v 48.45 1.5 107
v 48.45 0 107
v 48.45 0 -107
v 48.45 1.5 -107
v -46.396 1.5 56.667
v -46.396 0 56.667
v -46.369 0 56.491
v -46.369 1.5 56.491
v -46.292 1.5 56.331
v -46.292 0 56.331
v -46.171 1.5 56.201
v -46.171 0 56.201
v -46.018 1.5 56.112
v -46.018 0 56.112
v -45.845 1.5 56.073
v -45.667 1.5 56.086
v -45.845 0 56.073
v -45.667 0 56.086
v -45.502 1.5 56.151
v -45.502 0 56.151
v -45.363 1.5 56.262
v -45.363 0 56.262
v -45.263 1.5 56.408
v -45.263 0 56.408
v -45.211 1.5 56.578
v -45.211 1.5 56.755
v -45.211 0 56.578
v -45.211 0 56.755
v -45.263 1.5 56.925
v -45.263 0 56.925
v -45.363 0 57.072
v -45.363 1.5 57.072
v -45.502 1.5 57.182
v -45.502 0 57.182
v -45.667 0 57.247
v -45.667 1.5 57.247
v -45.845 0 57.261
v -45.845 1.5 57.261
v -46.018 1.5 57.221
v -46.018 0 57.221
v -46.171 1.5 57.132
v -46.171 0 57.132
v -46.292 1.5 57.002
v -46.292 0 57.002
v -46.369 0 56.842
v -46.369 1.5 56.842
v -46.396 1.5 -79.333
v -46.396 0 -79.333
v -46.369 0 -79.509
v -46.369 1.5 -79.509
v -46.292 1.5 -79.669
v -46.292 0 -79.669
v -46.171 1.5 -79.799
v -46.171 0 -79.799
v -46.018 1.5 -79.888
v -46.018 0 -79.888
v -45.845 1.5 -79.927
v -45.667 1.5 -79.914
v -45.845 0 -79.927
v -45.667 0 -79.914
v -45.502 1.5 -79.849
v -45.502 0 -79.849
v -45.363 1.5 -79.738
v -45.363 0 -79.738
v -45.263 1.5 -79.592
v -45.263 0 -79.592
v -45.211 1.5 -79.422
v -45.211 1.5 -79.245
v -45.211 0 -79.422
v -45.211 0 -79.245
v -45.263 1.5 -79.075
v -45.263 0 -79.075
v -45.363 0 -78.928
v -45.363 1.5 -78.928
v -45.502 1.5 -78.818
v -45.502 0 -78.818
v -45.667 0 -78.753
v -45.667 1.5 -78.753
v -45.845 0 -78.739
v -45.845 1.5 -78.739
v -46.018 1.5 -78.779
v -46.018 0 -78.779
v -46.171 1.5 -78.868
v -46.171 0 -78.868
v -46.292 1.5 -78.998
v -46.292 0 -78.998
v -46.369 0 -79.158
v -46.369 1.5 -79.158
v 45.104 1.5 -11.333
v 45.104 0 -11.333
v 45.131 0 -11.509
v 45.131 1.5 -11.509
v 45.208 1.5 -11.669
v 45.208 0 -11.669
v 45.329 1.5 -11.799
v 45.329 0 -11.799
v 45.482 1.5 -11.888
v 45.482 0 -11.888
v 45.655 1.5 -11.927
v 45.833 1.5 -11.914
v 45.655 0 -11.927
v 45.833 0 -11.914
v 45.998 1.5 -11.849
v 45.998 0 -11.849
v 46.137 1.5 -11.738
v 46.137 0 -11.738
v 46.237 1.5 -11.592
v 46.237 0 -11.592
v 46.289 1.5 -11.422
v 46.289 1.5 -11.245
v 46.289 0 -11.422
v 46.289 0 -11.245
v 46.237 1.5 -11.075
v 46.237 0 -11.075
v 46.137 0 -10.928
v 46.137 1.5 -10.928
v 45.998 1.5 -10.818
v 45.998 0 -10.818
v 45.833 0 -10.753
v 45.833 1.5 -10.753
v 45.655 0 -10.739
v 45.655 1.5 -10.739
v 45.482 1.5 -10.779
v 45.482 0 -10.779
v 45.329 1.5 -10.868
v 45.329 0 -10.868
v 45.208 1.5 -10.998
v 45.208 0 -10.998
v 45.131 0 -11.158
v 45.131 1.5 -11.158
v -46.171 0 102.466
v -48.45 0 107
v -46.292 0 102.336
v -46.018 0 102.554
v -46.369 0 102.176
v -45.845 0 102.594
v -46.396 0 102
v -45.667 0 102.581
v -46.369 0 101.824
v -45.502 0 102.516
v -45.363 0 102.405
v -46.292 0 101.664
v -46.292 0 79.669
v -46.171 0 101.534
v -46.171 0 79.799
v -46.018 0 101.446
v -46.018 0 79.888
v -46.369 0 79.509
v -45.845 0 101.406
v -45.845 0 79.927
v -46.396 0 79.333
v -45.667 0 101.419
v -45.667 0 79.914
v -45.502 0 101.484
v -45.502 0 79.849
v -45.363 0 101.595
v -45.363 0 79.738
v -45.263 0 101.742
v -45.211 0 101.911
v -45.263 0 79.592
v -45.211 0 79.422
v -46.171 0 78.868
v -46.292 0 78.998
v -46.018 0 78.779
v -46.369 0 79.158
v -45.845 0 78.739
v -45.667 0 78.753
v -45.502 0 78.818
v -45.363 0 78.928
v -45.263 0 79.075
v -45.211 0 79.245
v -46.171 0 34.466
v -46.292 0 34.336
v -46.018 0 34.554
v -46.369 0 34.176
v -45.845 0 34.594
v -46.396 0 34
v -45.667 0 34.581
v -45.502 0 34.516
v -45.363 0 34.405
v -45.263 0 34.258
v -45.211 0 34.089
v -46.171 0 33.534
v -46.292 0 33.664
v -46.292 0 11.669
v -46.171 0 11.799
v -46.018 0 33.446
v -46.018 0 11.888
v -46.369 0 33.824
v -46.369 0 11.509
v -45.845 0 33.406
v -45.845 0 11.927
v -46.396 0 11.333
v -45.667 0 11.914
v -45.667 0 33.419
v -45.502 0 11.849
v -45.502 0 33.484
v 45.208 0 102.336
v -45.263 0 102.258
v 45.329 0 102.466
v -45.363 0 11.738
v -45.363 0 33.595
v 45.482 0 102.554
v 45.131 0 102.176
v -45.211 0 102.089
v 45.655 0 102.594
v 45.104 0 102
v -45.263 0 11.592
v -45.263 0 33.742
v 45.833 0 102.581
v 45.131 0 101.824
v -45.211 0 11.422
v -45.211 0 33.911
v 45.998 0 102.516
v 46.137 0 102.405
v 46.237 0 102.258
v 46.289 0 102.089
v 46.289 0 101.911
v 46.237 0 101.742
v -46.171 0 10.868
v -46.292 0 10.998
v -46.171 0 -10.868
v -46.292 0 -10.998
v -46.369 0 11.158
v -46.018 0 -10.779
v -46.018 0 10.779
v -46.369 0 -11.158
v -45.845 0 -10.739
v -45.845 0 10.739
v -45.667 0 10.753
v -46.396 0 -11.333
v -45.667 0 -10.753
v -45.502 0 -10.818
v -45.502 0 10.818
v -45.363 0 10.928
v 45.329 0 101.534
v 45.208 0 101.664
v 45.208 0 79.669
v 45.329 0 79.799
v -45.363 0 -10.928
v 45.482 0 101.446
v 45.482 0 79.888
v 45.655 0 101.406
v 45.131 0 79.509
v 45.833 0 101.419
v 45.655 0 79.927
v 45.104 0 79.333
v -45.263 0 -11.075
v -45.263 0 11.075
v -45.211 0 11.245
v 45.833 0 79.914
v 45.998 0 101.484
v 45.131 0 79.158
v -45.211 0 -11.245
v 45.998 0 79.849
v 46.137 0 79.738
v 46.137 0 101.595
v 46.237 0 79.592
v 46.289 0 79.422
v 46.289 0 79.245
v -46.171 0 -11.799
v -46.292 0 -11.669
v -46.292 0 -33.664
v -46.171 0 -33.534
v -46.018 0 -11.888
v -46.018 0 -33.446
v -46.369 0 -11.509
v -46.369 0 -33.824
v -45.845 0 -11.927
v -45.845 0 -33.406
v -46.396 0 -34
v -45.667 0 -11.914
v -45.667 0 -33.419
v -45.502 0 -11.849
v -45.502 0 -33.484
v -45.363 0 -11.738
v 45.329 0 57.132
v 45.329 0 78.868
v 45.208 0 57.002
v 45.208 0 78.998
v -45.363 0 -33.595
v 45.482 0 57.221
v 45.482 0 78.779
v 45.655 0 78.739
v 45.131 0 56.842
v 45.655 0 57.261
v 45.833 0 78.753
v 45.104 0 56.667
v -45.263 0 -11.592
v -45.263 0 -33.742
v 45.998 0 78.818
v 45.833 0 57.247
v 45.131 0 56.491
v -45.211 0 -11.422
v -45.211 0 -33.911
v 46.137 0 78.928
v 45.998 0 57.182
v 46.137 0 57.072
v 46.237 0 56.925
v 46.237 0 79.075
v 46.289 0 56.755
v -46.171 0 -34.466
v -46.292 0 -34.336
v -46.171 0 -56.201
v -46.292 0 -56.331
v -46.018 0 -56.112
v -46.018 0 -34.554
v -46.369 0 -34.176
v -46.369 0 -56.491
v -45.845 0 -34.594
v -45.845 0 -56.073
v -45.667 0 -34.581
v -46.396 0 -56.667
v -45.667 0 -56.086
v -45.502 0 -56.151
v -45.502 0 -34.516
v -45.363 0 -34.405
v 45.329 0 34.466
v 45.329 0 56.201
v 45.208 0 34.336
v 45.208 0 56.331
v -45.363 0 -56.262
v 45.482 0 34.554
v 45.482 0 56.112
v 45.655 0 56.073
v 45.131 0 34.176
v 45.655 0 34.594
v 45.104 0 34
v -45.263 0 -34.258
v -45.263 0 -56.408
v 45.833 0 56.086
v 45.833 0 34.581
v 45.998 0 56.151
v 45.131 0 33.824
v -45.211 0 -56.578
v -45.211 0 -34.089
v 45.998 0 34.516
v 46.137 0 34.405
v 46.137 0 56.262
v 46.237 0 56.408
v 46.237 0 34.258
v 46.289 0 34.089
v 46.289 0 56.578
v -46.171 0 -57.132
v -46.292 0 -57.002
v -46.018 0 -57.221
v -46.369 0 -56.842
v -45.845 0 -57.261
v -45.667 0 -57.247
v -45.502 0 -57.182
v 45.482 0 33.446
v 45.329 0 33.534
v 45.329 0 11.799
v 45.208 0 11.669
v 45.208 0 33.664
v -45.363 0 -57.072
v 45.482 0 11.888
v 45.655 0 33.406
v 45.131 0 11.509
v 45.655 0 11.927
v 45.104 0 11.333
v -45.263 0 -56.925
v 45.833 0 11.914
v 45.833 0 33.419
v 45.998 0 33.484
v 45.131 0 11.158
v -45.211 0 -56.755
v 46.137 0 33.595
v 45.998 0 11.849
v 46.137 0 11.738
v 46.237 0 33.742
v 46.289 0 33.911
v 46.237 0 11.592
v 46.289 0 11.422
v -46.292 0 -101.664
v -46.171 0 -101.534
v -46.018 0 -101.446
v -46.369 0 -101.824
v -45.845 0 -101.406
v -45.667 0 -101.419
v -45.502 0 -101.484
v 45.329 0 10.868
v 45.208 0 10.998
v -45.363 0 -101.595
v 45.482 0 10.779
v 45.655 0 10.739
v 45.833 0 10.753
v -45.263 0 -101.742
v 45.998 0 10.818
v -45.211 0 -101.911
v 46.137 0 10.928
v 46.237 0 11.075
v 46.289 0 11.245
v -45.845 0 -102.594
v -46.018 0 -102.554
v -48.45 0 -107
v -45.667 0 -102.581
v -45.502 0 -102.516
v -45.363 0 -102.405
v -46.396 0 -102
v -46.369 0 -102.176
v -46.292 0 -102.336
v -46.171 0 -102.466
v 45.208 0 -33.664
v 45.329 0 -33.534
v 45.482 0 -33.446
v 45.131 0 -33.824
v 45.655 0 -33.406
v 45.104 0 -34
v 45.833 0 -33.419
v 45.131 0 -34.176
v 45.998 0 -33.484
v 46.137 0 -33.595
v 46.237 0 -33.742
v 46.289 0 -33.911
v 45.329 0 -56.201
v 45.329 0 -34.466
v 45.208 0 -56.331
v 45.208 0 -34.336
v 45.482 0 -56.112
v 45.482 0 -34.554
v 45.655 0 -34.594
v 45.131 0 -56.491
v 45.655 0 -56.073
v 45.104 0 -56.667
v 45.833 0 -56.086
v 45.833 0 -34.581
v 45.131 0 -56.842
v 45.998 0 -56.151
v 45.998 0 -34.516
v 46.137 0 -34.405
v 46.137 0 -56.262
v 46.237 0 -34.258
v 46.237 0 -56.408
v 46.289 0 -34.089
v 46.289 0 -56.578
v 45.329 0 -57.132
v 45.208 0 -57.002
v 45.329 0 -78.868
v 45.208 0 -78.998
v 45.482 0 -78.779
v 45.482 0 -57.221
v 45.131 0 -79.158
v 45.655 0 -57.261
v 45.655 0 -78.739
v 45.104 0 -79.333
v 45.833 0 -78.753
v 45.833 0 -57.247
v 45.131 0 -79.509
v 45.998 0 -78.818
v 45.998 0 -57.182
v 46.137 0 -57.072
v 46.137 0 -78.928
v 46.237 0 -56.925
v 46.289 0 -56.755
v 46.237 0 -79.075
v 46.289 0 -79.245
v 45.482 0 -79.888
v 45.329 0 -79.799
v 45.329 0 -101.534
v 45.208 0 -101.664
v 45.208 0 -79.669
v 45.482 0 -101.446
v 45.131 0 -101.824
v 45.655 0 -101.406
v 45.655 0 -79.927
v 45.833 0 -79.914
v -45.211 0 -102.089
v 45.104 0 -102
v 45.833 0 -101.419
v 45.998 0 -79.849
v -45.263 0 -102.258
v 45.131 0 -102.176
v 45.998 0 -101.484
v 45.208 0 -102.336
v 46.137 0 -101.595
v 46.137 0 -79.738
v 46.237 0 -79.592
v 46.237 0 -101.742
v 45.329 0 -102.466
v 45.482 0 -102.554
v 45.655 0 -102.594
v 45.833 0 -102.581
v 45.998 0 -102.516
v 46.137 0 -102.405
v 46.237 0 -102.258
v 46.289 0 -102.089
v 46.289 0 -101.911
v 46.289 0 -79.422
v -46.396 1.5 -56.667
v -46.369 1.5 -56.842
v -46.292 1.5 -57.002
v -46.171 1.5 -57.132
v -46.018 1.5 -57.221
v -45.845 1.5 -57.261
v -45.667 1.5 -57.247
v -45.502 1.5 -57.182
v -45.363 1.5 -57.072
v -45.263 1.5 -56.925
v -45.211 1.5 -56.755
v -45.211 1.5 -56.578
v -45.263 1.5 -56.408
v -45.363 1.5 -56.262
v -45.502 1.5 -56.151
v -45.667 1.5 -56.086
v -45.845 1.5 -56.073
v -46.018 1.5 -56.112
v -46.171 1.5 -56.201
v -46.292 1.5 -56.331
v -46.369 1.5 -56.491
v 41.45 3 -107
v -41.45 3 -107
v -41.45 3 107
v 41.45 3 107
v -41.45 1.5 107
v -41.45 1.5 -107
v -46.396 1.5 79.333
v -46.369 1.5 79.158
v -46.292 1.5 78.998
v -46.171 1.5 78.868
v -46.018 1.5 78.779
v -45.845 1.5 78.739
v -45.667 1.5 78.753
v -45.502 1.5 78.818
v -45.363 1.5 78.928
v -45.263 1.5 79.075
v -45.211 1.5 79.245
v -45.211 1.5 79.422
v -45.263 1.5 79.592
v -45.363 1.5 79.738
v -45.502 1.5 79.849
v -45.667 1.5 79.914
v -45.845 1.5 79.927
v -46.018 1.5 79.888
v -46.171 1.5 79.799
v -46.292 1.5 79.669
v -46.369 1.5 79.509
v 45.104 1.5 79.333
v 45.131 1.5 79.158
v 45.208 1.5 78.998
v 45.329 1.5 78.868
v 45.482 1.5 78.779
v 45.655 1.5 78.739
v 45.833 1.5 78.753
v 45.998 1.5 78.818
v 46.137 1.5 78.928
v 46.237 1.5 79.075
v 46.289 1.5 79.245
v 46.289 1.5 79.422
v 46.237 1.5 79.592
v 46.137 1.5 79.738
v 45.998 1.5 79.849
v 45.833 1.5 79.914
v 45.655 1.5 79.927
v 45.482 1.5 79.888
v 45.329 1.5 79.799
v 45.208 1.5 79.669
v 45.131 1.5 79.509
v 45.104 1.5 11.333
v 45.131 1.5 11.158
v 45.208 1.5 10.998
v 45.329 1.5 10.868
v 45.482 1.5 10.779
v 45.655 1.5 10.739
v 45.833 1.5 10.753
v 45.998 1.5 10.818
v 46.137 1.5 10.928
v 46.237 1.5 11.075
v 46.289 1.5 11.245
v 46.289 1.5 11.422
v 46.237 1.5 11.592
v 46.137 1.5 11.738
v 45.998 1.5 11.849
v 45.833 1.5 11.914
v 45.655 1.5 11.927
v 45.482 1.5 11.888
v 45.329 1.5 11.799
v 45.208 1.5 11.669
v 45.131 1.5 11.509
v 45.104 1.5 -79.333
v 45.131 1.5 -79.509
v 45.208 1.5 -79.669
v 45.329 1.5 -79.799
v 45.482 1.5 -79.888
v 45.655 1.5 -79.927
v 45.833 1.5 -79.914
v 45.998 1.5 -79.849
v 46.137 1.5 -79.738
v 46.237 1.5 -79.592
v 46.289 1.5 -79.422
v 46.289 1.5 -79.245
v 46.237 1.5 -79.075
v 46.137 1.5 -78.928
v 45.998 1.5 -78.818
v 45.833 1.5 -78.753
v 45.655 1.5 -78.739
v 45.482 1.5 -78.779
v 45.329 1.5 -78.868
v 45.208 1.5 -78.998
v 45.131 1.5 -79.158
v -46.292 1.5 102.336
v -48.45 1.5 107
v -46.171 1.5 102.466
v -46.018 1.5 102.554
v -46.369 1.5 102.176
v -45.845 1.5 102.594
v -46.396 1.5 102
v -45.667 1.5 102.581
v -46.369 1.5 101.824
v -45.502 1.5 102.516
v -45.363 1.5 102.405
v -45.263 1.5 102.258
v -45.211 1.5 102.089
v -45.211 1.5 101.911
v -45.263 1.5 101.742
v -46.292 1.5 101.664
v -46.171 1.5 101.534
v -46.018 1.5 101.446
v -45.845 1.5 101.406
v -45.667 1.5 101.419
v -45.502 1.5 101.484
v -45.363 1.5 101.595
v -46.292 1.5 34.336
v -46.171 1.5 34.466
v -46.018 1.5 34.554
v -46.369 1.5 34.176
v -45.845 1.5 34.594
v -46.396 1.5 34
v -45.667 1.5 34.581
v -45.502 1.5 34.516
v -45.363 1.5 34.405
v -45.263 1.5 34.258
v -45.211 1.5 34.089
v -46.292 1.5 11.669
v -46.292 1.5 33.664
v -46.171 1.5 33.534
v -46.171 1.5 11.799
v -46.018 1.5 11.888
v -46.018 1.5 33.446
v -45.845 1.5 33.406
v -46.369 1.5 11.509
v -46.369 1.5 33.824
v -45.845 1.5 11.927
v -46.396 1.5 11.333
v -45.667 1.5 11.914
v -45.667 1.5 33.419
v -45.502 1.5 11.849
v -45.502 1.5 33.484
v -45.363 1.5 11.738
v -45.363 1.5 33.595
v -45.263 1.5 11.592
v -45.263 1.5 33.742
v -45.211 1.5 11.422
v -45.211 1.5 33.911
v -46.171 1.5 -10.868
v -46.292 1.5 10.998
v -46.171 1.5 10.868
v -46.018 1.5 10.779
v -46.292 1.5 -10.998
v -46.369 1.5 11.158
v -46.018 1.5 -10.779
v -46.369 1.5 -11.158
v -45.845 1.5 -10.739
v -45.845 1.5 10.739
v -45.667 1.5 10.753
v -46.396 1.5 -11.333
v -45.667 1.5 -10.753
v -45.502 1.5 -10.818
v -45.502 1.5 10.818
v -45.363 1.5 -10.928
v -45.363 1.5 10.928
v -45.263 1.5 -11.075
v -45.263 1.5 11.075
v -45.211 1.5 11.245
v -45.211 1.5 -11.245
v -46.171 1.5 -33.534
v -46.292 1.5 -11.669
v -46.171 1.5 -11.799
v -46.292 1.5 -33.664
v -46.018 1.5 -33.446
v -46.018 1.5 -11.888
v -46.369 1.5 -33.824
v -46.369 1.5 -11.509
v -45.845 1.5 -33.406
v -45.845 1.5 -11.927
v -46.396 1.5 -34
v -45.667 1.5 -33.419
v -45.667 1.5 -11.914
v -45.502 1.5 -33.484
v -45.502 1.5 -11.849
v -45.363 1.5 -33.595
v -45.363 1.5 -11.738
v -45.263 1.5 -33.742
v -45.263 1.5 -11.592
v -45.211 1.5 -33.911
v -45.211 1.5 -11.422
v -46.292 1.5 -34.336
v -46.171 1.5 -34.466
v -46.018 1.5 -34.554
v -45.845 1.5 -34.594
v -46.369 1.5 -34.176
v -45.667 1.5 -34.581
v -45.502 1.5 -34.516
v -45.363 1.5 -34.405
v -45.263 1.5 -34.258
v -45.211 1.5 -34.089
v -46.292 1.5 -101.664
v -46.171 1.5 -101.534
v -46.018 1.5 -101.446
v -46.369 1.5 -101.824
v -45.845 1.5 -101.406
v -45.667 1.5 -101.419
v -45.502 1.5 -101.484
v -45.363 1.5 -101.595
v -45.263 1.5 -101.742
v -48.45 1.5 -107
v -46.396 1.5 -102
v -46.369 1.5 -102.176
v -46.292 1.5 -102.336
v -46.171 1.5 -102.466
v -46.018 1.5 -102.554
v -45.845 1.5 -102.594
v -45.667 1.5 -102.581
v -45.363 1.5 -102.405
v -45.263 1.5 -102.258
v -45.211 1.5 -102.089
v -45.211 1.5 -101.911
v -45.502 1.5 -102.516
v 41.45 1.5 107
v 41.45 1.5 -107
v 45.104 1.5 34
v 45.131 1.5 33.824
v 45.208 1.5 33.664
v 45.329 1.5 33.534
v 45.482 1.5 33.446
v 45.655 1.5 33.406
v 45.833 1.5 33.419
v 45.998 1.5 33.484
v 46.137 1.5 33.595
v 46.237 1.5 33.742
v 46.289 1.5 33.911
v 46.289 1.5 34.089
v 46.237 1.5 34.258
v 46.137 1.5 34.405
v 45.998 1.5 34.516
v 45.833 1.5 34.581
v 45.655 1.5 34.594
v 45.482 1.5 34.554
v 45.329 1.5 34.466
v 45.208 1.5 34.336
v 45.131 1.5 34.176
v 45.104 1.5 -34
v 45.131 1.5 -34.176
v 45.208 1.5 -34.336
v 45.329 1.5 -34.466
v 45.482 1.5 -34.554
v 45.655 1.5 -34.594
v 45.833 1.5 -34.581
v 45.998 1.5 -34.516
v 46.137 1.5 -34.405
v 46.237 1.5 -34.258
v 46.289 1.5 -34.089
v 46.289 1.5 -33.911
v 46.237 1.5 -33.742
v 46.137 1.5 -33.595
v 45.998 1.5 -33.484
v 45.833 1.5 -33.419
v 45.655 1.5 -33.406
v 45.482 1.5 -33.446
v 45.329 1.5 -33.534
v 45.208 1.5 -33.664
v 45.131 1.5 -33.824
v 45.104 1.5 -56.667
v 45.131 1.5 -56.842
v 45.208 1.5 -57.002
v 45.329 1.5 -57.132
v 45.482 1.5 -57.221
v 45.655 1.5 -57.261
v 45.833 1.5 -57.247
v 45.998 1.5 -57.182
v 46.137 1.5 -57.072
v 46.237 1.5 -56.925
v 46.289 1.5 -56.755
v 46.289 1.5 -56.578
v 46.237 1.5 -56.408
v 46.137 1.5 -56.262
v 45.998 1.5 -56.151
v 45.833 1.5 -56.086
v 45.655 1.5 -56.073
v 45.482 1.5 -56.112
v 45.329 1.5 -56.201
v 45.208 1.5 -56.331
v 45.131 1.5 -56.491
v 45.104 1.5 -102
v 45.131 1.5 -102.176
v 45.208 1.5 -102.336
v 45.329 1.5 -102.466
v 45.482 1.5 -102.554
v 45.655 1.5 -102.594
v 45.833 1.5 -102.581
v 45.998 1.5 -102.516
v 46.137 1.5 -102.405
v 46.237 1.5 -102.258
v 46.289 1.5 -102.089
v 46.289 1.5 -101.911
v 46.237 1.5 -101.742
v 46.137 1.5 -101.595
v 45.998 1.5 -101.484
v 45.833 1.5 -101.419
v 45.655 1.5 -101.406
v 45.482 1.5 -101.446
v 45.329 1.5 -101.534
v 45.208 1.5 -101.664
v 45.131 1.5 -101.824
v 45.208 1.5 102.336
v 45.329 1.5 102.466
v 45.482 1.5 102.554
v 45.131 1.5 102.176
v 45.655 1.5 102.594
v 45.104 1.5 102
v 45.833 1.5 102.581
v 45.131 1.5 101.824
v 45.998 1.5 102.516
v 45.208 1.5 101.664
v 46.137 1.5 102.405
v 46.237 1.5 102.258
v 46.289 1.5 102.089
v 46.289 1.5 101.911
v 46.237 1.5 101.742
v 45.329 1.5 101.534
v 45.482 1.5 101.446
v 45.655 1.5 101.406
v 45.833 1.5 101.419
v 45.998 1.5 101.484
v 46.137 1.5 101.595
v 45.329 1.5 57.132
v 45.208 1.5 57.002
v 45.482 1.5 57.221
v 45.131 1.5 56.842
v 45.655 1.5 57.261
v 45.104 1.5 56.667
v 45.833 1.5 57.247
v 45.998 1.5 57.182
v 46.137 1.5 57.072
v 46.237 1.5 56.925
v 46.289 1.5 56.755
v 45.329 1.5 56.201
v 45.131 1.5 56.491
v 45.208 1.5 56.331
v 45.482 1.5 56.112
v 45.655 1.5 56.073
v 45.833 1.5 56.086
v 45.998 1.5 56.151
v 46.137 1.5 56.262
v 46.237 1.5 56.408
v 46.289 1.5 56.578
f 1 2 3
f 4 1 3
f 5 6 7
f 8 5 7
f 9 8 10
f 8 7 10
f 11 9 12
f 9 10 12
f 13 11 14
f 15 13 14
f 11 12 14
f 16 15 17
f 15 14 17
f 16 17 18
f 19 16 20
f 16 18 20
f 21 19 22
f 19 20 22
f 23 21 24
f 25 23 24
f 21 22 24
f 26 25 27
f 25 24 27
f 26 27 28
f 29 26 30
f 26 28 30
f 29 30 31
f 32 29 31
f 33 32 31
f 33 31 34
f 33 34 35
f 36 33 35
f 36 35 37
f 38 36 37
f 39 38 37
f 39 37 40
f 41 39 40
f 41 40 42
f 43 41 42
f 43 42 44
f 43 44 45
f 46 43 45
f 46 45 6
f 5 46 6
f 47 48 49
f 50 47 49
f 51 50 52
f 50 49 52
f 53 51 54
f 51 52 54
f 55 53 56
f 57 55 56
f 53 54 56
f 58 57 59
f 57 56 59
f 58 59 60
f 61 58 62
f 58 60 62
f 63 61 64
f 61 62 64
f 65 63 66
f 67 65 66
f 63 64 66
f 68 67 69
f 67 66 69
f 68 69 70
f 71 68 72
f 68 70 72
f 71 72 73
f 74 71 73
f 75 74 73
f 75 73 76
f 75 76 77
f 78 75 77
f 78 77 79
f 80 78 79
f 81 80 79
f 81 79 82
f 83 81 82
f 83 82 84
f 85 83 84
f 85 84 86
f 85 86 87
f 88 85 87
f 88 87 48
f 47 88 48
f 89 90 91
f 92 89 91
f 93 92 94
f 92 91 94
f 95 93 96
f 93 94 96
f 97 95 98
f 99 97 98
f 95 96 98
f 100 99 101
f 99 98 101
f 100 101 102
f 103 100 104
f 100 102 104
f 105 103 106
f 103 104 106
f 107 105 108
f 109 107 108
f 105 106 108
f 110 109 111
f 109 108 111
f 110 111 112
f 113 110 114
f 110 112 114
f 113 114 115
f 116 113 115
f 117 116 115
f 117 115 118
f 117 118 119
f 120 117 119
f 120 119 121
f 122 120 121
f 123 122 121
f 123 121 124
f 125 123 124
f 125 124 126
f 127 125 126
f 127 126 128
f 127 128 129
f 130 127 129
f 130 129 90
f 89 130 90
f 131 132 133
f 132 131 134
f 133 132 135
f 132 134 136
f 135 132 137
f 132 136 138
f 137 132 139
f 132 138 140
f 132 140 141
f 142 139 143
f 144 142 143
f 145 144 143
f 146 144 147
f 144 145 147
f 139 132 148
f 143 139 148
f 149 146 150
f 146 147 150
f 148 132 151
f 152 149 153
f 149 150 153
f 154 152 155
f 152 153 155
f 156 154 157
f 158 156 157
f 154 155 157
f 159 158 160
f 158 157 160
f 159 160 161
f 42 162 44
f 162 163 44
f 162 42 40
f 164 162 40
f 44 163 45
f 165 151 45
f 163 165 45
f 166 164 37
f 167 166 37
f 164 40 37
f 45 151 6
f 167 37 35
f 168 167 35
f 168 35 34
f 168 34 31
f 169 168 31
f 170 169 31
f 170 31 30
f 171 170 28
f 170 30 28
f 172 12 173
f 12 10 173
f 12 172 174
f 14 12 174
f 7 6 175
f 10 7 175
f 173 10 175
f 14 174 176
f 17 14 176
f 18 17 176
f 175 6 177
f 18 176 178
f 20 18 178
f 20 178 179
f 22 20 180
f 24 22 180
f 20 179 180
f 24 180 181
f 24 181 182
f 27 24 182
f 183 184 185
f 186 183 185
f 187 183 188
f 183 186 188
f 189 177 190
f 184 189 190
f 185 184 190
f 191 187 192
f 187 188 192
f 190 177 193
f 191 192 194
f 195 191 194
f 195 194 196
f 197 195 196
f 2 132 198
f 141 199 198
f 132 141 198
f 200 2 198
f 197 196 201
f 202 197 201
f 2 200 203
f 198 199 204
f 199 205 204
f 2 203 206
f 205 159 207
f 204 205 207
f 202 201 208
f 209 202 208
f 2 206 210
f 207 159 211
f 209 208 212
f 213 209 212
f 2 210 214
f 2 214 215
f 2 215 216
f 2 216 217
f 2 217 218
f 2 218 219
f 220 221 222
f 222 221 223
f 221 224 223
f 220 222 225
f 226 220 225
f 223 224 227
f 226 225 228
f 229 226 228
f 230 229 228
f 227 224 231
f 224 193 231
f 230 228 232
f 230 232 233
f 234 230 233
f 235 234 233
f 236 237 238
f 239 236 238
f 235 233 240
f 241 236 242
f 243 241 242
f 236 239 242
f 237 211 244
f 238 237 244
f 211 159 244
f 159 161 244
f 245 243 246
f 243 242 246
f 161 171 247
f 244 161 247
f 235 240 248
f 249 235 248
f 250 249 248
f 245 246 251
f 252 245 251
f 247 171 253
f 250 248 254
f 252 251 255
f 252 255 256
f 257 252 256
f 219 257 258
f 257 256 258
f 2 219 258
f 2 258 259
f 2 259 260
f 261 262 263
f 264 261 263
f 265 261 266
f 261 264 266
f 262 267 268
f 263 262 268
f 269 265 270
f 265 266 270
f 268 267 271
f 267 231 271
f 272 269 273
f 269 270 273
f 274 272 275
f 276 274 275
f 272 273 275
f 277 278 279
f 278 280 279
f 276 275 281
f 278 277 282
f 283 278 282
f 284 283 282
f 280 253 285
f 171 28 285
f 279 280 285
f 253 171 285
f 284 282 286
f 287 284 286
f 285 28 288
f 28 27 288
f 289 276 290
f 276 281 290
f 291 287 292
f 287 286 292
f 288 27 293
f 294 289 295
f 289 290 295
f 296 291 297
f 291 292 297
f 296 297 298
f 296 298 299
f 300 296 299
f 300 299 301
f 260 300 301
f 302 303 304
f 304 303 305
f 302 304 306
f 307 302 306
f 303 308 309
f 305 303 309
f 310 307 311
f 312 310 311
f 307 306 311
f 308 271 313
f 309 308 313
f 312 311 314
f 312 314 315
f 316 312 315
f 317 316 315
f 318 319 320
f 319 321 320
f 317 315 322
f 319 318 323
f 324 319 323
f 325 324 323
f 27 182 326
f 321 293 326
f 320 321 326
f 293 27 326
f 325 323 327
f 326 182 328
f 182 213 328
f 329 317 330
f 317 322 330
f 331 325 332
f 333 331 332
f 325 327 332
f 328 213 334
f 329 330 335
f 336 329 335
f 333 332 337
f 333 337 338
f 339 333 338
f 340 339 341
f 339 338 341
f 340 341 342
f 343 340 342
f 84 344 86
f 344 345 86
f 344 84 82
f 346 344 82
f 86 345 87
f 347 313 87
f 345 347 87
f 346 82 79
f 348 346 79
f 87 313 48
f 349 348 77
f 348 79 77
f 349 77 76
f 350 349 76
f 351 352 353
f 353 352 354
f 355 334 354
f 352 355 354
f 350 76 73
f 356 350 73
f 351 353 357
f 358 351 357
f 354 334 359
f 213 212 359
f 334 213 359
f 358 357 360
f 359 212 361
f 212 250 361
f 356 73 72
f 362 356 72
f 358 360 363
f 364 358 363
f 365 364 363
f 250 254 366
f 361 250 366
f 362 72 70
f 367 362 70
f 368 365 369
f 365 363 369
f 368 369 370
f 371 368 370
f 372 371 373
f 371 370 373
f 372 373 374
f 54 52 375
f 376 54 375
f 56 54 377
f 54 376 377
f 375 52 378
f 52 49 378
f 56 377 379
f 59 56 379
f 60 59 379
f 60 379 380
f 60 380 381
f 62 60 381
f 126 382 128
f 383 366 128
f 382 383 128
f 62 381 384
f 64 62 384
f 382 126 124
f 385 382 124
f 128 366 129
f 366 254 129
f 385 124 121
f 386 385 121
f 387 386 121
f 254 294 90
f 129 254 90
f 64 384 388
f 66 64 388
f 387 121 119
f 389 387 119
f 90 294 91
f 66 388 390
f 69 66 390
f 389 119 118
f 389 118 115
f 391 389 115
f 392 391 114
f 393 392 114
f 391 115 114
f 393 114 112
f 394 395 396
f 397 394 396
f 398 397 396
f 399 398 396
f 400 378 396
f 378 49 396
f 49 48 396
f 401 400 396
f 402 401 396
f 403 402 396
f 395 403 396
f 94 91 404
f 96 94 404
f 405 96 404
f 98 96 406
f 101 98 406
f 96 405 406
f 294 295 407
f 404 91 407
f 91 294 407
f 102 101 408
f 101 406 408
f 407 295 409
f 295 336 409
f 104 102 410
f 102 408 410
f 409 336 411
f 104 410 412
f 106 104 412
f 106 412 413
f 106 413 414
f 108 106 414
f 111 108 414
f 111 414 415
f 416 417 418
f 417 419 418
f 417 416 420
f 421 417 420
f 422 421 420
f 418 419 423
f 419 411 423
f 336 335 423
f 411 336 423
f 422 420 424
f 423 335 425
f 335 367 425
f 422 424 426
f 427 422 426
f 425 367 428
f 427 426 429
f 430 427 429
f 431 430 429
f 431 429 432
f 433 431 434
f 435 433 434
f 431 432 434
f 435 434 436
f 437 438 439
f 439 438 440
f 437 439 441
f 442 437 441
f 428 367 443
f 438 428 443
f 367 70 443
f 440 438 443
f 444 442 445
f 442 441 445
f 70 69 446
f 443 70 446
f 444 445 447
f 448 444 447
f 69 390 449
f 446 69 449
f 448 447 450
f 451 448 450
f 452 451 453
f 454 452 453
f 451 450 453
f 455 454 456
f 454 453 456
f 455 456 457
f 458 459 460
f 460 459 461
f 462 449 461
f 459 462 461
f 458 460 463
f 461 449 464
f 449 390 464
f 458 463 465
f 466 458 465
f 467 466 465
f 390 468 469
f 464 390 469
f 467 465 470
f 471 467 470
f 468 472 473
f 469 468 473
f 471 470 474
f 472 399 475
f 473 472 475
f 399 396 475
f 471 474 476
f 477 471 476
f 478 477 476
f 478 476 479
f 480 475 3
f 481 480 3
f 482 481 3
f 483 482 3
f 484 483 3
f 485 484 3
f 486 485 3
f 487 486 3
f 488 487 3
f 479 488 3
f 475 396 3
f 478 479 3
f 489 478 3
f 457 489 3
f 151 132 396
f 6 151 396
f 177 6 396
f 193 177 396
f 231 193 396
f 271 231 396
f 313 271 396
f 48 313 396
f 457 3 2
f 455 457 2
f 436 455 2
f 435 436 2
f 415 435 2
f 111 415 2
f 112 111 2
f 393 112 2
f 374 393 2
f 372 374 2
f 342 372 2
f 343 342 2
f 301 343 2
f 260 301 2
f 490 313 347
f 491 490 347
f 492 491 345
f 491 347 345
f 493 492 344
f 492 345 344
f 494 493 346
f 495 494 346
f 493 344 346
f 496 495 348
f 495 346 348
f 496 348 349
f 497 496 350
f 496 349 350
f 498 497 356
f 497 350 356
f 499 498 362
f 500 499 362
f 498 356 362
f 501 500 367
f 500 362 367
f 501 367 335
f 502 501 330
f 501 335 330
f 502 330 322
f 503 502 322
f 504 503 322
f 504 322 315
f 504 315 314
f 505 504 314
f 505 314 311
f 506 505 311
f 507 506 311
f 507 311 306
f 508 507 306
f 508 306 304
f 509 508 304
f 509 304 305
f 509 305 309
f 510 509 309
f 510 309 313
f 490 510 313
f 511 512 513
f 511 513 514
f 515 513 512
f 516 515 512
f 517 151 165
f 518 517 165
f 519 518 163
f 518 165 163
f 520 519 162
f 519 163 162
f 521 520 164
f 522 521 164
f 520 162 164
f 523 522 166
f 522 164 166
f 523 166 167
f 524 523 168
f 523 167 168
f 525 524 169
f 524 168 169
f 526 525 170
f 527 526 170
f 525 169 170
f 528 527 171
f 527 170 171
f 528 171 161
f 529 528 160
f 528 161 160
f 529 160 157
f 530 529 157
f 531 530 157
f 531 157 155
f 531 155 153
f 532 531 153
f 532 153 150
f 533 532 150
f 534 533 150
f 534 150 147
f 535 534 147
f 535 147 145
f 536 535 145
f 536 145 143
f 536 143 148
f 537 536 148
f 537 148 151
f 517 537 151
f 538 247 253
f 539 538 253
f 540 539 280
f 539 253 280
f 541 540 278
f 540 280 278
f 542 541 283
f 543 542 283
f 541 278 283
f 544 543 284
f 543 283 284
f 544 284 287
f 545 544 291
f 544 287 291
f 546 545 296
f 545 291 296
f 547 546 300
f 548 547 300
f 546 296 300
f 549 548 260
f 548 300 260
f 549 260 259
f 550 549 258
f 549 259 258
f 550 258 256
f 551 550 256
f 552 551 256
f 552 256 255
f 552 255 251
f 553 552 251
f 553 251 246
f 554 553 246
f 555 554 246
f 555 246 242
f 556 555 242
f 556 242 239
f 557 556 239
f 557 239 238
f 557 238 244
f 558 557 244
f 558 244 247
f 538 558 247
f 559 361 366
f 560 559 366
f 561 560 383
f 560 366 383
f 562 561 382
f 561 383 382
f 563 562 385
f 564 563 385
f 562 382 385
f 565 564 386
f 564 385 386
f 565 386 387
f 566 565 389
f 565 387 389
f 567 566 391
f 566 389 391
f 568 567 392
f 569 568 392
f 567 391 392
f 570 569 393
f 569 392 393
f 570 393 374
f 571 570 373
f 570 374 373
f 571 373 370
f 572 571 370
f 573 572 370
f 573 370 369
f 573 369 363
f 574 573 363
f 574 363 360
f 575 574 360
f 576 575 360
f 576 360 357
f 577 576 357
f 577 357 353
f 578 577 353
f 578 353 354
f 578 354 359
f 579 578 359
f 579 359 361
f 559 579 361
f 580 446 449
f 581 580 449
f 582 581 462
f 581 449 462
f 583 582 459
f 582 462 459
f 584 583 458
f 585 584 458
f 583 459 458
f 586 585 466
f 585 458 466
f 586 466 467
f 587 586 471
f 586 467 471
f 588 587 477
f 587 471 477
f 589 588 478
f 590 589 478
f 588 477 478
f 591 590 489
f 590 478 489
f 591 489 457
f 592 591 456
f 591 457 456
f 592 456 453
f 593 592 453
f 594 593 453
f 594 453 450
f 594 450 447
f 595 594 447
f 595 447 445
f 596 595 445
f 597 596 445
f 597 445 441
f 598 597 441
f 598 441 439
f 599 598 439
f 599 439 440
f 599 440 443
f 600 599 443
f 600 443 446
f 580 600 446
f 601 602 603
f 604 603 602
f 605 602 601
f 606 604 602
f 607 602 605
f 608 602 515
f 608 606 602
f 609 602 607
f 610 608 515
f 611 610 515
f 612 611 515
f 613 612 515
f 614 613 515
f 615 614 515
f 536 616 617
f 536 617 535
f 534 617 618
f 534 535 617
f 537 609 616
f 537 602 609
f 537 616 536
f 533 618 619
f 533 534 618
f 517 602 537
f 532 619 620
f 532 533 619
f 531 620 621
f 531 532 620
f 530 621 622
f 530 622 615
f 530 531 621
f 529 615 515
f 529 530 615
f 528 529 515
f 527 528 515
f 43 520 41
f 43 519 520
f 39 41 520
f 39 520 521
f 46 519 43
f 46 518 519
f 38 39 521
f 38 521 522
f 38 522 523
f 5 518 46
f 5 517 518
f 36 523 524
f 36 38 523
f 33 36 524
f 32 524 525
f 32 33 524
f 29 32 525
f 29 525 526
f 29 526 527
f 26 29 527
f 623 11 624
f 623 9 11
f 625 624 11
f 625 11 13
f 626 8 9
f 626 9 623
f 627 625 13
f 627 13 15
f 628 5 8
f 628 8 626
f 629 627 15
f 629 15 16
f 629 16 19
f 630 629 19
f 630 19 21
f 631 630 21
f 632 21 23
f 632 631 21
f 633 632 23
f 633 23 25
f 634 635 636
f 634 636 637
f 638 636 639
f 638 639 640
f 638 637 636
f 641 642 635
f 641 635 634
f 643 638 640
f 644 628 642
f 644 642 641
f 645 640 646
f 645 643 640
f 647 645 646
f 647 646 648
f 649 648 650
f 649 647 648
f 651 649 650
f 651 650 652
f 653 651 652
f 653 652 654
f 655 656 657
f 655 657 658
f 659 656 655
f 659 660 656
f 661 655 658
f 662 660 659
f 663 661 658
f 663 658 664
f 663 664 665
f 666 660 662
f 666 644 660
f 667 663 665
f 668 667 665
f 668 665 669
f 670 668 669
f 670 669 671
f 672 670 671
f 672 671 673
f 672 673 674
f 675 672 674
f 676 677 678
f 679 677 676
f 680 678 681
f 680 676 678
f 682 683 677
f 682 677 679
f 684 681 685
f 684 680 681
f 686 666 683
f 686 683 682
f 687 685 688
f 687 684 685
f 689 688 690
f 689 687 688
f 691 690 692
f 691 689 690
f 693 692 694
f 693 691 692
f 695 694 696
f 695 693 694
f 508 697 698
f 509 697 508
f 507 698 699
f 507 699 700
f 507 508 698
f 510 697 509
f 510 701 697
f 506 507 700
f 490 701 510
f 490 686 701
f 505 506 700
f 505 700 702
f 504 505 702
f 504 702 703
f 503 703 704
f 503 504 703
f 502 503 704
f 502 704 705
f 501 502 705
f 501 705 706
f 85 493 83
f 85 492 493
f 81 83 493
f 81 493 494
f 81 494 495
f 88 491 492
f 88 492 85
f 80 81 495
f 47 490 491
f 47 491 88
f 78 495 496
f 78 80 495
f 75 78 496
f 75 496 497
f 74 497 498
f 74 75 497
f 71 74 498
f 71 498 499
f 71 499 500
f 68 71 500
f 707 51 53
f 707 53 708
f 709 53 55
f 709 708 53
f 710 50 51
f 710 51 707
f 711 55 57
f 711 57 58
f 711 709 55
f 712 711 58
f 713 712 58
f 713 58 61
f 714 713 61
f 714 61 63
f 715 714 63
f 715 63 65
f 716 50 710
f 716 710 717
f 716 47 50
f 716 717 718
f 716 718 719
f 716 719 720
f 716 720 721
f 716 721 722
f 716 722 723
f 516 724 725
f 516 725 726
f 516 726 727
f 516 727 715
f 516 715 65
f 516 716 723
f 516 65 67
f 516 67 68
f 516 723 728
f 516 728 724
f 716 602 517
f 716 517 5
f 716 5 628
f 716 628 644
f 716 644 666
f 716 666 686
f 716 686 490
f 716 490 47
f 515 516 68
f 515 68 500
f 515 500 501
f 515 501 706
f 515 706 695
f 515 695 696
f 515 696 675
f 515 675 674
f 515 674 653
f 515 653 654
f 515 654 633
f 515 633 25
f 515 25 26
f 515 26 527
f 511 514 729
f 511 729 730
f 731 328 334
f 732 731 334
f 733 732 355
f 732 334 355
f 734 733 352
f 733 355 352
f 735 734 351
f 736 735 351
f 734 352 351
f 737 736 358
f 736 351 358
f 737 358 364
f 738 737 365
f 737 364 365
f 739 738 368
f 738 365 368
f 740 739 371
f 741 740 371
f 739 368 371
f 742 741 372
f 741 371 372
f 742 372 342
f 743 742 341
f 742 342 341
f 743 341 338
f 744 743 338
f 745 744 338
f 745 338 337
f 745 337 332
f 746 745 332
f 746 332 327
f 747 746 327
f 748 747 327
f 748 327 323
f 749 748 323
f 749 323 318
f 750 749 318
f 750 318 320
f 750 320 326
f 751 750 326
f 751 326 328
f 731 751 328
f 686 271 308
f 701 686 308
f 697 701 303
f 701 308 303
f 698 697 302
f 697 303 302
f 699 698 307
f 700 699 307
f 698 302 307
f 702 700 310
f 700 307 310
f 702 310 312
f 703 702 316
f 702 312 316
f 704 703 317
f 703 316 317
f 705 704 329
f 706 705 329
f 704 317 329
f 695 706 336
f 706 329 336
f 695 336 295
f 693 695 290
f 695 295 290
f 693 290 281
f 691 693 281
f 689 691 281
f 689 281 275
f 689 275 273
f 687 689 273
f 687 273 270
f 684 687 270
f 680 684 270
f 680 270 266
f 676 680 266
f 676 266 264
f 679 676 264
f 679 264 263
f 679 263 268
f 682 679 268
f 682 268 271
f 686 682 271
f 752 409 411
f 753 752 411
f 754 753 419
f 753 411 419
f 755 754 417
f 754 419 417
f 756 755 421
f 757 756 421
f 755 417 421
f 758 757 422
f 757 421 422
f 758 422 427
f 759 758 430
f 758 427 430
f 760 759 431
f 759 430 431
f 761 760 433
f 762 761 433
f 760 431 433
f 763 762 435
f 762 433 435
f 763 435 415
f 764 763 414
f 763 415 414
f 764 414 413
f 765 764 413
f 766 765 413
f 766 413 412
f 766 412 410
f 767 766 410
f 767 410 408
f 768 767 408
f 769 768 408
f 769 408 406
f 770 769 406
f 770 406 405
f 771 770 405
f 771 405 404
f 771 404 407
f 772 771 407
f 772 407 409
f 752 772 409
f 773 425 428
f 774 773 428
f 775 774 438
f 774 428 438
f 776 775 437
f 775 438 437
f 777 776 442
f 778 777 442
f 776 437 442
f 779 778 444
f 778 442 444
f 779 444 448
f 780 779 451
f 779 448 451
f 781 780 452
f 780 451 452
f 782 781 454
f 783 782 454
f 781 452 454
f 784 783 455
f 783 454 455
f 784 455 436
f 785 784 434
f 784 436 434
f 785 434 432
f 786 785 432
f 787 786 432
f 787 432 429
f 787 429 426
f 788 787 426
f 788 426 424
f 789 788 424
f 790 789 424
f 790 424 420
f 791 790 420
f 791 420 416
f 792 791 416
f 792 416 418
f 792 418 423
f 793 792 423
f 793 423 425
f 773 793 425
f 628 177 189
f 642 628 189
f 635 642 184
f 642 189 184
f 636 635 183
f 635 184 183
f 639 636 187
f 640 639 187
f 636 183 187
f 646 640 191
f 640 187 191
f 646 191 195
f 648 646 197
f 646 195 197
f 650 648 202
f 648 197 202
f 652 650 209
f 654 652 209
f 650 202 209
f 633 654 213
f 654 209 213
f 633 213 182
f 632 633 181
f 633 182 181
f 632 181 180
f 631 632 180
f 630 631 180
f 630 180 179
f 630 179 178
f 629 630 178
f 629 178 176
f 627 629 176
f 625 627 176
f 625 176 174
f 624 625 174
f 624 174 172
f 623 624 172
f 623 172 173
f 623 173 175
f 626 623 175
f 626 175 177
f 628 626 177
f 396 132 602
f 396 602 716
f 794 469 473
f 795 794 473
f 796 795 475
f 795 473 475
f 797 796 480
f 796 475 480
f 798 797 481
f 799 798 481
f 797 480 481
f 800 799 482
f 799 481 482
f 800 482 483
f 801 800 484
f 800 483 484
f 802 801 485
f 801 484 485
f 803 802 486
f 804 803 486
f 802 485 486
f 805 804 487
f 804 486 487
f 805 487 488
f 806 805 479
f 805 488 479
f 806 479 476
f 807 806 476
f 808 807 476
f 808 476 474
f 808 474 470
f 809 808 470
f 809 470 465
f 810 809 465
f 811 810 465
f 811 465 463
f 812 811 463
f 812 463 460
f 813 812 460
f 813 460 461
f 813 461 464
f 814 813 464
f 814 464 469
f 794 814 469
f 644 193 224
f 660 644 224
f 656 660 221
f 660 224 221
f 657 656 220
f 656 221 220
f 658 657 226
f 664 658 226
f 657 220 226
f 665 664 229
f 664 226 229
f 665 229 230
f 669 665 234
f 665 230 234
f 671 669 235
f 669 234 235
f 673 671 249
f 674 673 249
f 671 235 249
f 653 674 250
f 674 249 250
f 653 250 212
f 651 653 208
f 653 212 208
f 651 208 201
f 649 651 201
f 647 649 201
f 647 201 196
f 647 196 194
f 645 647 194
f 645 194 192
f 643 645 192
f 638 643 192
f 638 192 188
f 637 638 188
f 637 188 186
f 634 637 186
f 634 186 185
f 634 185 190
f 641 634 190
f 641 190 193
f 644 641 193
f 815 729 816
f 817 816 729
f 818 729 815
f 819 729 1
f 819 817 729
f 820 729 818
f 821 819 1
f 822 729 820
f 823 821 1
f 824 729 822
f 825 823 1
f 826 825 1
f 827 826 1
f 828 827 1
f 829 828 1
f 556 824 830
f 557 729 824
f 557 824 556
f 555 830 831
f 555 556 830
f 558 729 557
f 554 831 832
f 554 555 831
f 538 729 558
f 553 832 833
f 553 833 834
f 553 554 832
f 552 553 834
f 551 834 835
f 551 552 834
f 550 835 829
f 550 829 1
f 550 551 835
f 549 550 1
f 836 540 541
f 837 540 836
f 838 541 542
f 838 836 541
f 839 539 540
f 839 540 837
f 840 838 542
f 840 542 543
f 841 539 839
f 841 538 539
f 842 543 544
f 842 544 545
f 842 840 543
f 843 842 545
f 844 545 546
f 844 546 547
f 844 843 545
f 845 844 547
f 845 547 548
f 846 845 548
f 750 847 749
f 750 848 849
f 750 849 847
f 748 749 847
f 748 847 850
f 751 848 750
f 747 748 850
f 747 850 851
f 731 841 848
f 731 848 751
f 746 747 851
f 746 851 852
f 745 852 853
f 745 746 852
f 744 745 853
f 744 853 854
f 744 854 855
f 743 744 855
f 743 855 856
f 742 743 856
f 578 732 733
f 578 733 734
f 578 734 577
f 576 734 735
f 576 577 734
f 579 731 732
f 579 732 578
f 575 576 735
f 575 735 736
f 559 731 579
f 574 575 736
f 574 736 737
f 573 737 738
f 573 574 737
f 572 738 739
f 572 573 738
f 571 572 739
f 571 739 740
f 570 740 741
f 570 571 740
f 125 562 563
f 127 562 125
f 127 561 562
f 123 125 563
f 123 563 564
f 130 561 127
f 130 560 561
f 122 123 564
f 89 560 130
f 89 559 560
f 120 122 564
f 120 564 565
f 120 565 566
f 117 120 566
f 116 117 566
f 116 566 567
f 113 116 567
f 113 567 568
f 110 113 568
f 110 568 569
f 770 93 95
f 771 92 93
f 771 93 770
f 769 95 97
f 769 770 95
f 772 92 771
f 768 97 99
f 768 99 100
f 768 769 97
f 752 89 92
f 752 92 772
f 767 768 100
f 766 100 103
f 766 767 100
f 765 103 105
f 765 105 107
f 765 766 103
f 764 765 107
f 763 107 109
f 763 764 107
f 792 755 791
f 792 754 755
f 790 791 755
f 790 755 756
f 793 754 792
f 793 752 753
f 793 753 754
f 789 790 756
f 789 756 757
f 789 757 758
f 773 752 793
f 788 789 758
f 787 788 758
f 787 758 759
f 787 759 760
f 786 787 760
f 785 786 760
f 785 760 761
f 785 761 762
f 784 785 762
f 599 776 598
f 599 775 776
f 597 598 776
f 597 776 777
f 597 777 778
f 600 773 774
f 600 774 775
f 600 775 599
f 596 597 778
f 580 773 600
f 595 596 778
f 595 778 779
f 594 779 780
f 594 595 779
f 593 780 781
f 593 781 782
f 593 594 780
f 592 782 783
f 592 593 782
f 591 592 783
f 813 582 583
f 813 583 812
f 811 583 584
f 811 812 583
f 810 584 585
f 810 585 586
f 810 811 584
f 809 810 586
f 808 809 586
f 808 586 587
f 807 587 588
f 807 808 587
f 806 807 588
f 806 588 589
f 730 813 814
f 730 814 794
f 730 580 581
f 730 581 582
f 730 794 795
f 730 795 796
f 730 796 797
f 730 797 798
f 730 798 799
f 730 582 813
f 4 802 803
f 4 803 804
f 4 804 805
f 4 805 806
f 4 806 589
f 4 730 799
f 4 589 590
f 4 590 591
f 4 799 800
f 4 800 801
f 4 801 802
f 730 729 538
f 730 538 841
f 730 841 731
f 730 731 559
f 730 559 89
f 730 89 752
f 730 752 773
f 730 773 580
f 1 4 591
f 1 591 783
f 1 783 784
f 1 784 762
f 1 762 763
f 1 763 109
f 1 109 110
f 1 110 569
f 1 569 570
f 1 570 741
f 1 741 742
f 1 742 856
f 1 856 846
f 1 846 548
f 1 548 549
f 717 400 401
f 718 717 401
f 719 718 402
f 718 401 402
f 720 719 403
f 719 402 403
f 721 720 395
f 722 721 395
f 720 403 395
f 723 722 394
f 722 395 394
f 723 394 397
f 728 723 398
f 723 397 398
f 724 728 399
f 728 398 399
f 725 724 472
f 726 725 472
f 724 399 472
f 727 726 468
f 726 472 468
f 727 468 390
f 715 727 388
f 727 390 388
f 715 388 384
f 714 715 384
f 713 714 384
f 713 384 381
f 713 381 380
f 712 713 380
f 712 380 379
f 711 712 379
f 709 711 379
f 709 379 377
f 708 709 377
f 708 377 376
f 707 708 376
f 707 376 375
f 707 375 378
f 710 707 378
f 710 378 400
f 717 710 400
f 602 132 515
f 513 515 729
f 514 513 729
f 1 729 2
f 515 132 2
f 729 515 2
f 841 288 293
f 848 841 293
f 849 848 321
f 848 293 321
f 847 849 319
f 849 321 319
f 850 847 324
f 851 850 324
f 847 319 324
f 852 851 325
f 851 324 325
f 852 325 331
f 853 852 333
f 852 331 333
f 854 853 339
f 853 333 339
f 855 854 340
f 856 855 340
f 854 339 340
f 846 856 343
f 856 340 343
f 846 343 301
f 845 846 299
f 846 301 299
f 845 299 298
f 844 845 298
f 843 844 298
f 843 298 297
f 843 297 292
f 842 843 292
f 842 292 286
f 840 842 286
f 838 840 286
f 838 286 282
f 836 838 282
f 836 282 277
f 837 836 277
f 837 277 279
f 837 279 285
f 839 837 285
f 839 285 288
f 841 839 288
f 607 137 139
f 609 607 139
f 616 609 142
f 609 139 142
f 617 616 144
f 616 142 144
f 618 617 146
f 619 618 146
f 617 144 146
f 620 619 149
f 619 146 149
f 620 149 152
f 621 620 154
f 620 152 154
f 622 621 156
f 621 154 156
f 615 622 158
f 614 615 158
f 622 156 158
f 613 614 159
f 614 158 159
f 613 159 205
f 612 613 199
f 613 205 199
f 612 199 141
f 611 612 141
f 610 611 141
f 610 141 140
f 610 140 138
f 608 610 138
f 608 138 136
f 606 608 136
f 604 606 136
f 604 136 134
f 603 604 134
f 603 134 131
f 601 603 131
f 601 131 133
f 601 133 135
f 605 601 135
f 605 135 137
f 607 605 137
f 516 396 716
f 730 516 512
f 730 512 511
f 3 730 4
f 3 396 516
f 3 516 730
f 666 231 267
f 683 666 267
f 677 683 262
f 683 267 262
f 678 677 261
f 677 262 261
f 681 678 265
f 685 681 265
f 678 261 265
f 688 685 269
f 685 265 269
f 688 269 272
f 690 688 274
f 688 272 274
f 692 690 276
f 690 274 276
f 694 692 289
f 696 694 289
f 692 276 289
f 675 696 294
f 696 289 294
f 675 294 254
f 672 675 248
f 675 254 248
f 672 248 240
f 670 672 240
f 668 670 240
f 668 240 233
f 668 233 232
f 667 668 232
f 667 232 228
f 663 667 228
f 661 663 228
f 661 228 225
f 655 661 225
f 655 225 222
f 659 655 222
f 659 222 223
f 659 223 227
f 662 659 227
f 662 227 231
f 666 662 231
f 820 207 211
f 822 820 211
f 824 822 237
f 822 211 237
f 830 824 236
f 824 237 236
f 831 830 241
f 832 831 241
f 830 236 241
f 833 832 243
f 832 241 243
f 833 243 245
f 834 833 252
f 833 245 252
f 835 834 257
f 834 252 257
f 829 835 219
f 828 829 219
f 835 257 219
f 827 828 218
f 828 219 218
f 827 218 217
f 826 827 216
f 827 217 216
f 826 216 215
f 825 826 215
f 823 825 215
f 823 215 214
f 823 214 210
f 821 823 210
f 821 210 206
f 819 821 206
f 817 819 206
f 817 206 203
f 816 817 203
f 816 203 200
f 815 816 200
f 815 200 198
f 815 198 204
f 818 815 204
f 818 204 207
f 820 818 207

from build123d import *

# Parameters (mm, degrees)
SKETCH1_W                 = 96.9
SKETCH1_H                 = 214
BOSS_EXTRUDE1_DEPTH       = 3
SKETCH2_W                 = 7
SKETCH2_H                 = 214
CUT_EXTRUDE1_DEPTH        = 1.5
F_0_80_TAPPED_HOLE1_D     = 1.19126
F_0_80_TAPPED_HOLE1_DEPTH = 4.0005
F_0_80_TAPPED_HOLE1_TIP   = 0.357890611


with BuildPart() as part:
    # Sketch1 → Boss-Extrude1 (new body)
    with BuildSketch(Plane(origin=(0, 0, 0), x_dir=(1, 0, 0), z_dir=(0, 1, 0))):
        Rectangle(SKETCH1_W, SKETCH1_H)
    extrude(amount=BOSS_EXTRUDE1_DEPTH)

    # Sketch2 → Cut-Extrude1 (cut)
    with BuildSketch(Plane(origin=(0, 3, 0), x_dir=(1, 0, 0), z_dir=(0, 1, 0))):
        with Locations((44.95, 0)):
            Rectangle(SKETCH2_W, SKETCH2_H)
        with Locations((-44.95, 0)):
            Rectangle(SKETCH2_W, SKETCH2_H)
    extrude(amount=-CUT_EXTRUDE1_DEPTH, mode=Mode.SUBTRACT)

    # #0-80 Tapped Hole1
    with Locations(Plane(origin=(0, 3, 0), x_dir=(1, 0, 0), z_dir=(0, 1, 0))):
        with Locations((45.7, -102), (-45.8, -102), (45.7, -79.333333333), (-45.8, -79.333333333), (45.7, -56.666666667), (-45.8, -56.666666667), (45.7, -34), (-45.8, -34), (45.7, -11.333333333), (-45.8, -11.333333333), (45.7, 11.333333333), (-45.8, 11.333333333), (45.7, 34), (-45.8, 34), (45.7, 56.666666667), (-45.8, 56.666666667), (45.7, 79.333333333), (-45.8, 79.333333333), (45.7, 102), (-45.8, 102)):
            Hole(F_0_80_TAPPED_HOLE1_D / 2, depth=F_0_80_TAPPED_HOLE1_DEPTH)
            with Locations((0, 0, -(F_0_80_TAPPED_HOLE1_DEPTH + F_0_80_TAPPED_HOLE1_TIP / 2))):  # 118° drill point
                Cone(0, F_0_80_TAPPED_HOLE1_D / 2, F_0_80_TAPPED_HOLE1_TIP, mode=Mode.SUBTRACT)


solid = part.part
